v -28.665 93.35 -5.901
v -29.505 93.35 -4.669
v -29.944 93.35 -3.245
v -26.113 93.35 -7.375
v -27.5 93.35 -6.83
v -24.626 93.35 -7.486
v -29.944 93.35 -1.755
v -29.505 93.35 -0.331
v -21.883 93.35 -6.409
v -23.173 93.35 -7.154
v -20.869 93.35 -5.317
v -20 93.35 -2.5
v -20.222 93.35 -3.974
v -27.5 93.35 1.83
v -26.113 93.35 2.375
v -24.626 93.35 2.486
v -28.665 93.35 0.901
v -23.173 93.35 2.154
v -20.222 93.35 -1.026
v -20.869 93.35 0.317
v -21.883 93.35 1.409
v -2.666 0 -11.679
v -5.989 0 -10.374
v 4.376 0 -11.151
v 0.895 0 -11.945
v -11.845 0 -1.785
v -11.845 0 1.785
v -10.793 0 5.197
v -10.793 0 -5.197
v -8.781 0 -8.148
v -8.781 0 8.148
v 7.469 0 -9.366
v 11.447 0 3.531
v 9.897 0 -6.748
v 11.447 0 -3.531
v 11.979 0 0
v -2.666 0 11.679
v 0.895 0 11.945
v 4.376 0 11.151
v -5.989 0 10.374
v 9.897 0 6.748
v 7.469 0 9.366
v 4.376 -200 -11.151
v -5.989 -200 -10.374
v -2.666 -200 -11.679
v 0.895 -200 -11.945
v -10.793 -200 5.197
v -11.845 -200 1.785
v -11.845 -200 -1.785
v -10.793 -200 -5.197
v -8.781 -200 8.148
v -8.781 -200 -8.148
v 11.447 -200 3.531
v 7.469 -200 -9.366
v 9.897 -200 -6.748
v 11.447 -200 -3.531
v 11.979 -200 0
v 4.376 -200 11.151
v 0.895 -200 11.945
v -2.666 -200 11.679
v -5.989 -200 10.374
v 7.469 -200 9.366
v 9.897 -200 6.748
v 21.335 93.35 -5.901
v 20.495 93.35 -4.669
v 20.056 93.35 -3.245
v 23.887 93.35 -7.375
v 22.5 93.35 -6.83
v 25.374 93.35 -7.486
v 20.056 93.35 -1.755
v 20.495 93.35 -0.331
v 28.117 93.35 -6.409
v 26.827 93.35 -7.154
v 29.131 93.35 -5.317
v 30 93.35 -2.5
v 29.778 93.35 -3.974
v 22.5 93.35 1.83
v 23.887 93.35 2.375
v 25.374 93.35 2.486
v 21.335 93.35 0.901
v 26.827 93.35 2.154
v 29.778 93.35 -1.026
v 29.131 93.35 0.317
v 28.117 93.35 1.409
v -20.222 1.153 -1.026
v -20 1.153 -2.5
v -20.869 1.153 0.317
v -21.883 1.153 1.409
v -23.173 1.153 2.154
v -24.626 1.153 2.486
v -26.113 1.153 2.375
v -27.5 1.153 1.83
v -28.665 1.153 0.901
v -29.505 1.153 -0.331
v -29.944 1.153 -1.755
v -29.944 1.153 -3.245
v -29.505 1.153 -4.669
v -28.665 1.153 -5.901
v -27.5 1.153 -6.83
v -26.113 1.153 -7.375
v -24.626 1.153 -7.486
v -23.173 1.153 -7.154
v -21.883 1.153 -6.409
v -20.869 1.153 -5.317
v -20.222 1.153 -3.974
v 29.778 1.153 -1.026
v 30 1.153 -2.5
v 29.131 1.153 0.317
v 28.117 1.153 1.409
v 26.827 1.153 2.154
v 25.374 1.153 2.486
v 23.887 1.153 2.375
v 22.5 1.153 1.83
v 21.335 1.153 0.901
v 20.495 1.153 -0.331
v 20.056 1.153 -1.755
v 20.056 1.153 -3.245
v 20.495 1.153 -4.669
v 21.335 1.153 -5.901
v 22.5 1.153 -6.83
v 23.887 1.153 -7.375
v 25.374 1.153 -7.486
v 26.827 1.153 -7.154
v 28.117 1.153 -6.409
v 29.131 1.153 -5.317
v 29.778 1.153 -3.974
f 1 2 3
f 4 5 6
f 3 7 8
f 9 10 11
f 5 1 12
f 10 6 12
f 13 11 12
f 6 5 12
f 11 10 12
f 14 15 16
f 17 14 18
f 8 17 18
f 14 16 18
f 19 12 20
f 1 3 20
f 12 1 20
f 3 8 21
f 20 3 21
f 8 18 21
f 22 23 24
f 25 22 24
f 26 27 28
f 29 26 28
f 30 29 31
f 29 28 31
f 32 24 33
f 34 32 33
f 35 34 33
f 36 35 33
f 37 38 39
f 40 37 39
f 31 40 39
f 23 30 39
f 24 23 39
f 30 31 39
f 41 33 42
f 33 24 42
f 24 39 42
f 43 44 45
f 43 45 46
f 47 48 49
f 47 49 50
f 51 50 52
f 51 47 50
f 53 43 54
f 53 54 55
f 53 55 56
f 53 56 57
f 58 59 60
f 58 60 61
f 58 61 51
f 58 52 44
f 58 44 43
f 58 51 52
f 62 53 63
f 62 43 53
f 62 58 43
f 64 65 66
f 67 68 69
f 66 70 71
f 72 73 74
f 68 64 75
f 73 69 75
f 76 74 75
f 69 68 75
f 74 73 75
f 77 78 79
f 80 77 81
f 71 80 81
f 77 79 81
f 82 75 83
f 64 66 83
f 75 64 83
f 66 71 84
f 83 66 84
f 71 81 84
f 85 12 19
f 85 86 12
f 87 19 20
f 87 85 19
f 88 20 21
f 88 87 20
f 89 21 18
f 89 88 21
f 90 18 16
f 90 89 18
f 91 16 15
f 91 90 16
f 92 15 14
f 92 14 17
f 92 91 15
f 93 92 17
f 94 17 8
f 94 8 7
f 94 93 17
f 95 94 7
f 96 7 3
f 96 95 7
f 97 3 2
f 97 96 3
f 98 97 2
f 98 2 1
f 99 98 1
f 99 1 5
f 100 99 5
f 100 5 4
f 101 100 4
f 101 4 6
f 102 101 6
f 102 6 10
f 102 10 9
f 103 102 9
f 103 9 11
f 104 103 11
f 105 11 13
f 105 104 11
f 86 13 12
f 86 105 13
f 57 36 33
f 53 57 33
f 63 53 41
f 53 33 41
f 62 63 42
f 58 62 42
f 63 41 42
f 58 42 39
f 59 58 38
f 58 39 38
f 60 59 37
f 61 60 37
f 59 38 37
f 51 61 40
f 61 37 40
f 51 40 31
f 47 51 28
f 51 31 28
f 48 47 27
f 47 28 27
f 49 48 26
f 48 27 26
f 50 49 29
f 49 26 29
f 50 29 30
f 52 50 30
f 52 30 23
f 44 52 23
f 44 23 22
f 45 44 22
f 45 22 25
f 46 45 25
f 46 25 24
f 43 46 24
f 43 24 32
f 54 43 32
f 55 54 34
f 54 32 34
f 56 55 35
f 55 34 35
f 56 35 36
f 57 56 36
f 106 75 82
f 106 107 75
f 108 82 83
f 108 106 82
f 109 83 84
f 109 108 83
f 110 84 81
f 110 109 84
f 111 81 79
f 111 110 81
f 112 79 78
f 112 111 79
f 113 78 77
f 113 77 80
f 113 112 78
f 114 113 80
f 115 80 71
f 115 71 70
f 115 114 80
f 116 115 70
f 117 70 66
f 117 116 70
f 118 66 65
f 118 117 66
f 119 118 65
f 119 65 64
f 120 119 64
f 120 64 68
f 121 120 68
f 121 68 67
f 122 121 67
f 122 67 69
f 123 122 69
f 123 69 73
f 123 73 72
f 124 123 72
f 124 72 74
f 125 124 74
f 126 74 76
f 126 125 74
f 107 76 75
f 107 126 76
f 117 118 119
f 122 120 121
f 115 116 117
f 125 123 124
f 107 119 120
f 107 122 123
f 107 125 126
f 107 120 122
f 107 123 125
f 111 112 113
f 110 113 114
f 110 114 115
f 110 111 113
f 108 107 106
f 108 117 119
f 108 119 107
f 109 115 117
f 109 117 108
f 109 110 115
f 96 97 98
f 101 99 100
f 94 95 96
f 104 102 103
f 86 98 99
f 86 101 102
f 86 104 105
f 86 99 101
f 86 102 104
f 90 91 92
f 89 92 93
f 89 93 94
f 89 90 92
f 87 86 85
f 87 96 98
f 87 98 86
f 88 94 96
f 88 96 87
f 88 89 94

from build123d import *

# Parameters (mm, degrees)
F1_R          = 11.9789339658
F3_DEPTH      = 200
F2_R          = 5
F4_DEPTH      = 48.8475
F4_DEPTH_BACK = 43.35047


# Not quite as in the source:
# - a feature of the source that left no trace in its solid (it failed there, or was rolled back) is left out


with BuildPart() as f3:
    # F1 (on Front) → F3 (new body)
    with BuildSketch(Plane.XZ):
        Circle(F1_R)
    extrude(amount=F3_DEPTH)


with BuildPart() as f4:
    # F2 (on offset) → F4 (new body, two sides)
    with BuildSketch(Plane.XZ.offset(-50)) as f4_sk:
        with Locations((-25, -2.5)):
            Circle(F2_R)
    extrude(amount=F4_DEPTH)
    extrude(f4_sk.sketch, amount=-F4_DEPTH_BACK)


with BuildPart() as f4b:
    # F2 (on offset) → F4, piece 2 (new body, two sides)
    with BuildSketch(Plane.XZ.offset(-50)) as f4_2_sk:
        with Locations((25, -2.5)):
            Circle(F2_R)
    extrude(amount=F4_DEPTH)
    extrude(f4_2_sk.sketch, amount=-F4_DEPTH_BACK)


solid = Compound([f3.part, f4.part, f4b.part])
